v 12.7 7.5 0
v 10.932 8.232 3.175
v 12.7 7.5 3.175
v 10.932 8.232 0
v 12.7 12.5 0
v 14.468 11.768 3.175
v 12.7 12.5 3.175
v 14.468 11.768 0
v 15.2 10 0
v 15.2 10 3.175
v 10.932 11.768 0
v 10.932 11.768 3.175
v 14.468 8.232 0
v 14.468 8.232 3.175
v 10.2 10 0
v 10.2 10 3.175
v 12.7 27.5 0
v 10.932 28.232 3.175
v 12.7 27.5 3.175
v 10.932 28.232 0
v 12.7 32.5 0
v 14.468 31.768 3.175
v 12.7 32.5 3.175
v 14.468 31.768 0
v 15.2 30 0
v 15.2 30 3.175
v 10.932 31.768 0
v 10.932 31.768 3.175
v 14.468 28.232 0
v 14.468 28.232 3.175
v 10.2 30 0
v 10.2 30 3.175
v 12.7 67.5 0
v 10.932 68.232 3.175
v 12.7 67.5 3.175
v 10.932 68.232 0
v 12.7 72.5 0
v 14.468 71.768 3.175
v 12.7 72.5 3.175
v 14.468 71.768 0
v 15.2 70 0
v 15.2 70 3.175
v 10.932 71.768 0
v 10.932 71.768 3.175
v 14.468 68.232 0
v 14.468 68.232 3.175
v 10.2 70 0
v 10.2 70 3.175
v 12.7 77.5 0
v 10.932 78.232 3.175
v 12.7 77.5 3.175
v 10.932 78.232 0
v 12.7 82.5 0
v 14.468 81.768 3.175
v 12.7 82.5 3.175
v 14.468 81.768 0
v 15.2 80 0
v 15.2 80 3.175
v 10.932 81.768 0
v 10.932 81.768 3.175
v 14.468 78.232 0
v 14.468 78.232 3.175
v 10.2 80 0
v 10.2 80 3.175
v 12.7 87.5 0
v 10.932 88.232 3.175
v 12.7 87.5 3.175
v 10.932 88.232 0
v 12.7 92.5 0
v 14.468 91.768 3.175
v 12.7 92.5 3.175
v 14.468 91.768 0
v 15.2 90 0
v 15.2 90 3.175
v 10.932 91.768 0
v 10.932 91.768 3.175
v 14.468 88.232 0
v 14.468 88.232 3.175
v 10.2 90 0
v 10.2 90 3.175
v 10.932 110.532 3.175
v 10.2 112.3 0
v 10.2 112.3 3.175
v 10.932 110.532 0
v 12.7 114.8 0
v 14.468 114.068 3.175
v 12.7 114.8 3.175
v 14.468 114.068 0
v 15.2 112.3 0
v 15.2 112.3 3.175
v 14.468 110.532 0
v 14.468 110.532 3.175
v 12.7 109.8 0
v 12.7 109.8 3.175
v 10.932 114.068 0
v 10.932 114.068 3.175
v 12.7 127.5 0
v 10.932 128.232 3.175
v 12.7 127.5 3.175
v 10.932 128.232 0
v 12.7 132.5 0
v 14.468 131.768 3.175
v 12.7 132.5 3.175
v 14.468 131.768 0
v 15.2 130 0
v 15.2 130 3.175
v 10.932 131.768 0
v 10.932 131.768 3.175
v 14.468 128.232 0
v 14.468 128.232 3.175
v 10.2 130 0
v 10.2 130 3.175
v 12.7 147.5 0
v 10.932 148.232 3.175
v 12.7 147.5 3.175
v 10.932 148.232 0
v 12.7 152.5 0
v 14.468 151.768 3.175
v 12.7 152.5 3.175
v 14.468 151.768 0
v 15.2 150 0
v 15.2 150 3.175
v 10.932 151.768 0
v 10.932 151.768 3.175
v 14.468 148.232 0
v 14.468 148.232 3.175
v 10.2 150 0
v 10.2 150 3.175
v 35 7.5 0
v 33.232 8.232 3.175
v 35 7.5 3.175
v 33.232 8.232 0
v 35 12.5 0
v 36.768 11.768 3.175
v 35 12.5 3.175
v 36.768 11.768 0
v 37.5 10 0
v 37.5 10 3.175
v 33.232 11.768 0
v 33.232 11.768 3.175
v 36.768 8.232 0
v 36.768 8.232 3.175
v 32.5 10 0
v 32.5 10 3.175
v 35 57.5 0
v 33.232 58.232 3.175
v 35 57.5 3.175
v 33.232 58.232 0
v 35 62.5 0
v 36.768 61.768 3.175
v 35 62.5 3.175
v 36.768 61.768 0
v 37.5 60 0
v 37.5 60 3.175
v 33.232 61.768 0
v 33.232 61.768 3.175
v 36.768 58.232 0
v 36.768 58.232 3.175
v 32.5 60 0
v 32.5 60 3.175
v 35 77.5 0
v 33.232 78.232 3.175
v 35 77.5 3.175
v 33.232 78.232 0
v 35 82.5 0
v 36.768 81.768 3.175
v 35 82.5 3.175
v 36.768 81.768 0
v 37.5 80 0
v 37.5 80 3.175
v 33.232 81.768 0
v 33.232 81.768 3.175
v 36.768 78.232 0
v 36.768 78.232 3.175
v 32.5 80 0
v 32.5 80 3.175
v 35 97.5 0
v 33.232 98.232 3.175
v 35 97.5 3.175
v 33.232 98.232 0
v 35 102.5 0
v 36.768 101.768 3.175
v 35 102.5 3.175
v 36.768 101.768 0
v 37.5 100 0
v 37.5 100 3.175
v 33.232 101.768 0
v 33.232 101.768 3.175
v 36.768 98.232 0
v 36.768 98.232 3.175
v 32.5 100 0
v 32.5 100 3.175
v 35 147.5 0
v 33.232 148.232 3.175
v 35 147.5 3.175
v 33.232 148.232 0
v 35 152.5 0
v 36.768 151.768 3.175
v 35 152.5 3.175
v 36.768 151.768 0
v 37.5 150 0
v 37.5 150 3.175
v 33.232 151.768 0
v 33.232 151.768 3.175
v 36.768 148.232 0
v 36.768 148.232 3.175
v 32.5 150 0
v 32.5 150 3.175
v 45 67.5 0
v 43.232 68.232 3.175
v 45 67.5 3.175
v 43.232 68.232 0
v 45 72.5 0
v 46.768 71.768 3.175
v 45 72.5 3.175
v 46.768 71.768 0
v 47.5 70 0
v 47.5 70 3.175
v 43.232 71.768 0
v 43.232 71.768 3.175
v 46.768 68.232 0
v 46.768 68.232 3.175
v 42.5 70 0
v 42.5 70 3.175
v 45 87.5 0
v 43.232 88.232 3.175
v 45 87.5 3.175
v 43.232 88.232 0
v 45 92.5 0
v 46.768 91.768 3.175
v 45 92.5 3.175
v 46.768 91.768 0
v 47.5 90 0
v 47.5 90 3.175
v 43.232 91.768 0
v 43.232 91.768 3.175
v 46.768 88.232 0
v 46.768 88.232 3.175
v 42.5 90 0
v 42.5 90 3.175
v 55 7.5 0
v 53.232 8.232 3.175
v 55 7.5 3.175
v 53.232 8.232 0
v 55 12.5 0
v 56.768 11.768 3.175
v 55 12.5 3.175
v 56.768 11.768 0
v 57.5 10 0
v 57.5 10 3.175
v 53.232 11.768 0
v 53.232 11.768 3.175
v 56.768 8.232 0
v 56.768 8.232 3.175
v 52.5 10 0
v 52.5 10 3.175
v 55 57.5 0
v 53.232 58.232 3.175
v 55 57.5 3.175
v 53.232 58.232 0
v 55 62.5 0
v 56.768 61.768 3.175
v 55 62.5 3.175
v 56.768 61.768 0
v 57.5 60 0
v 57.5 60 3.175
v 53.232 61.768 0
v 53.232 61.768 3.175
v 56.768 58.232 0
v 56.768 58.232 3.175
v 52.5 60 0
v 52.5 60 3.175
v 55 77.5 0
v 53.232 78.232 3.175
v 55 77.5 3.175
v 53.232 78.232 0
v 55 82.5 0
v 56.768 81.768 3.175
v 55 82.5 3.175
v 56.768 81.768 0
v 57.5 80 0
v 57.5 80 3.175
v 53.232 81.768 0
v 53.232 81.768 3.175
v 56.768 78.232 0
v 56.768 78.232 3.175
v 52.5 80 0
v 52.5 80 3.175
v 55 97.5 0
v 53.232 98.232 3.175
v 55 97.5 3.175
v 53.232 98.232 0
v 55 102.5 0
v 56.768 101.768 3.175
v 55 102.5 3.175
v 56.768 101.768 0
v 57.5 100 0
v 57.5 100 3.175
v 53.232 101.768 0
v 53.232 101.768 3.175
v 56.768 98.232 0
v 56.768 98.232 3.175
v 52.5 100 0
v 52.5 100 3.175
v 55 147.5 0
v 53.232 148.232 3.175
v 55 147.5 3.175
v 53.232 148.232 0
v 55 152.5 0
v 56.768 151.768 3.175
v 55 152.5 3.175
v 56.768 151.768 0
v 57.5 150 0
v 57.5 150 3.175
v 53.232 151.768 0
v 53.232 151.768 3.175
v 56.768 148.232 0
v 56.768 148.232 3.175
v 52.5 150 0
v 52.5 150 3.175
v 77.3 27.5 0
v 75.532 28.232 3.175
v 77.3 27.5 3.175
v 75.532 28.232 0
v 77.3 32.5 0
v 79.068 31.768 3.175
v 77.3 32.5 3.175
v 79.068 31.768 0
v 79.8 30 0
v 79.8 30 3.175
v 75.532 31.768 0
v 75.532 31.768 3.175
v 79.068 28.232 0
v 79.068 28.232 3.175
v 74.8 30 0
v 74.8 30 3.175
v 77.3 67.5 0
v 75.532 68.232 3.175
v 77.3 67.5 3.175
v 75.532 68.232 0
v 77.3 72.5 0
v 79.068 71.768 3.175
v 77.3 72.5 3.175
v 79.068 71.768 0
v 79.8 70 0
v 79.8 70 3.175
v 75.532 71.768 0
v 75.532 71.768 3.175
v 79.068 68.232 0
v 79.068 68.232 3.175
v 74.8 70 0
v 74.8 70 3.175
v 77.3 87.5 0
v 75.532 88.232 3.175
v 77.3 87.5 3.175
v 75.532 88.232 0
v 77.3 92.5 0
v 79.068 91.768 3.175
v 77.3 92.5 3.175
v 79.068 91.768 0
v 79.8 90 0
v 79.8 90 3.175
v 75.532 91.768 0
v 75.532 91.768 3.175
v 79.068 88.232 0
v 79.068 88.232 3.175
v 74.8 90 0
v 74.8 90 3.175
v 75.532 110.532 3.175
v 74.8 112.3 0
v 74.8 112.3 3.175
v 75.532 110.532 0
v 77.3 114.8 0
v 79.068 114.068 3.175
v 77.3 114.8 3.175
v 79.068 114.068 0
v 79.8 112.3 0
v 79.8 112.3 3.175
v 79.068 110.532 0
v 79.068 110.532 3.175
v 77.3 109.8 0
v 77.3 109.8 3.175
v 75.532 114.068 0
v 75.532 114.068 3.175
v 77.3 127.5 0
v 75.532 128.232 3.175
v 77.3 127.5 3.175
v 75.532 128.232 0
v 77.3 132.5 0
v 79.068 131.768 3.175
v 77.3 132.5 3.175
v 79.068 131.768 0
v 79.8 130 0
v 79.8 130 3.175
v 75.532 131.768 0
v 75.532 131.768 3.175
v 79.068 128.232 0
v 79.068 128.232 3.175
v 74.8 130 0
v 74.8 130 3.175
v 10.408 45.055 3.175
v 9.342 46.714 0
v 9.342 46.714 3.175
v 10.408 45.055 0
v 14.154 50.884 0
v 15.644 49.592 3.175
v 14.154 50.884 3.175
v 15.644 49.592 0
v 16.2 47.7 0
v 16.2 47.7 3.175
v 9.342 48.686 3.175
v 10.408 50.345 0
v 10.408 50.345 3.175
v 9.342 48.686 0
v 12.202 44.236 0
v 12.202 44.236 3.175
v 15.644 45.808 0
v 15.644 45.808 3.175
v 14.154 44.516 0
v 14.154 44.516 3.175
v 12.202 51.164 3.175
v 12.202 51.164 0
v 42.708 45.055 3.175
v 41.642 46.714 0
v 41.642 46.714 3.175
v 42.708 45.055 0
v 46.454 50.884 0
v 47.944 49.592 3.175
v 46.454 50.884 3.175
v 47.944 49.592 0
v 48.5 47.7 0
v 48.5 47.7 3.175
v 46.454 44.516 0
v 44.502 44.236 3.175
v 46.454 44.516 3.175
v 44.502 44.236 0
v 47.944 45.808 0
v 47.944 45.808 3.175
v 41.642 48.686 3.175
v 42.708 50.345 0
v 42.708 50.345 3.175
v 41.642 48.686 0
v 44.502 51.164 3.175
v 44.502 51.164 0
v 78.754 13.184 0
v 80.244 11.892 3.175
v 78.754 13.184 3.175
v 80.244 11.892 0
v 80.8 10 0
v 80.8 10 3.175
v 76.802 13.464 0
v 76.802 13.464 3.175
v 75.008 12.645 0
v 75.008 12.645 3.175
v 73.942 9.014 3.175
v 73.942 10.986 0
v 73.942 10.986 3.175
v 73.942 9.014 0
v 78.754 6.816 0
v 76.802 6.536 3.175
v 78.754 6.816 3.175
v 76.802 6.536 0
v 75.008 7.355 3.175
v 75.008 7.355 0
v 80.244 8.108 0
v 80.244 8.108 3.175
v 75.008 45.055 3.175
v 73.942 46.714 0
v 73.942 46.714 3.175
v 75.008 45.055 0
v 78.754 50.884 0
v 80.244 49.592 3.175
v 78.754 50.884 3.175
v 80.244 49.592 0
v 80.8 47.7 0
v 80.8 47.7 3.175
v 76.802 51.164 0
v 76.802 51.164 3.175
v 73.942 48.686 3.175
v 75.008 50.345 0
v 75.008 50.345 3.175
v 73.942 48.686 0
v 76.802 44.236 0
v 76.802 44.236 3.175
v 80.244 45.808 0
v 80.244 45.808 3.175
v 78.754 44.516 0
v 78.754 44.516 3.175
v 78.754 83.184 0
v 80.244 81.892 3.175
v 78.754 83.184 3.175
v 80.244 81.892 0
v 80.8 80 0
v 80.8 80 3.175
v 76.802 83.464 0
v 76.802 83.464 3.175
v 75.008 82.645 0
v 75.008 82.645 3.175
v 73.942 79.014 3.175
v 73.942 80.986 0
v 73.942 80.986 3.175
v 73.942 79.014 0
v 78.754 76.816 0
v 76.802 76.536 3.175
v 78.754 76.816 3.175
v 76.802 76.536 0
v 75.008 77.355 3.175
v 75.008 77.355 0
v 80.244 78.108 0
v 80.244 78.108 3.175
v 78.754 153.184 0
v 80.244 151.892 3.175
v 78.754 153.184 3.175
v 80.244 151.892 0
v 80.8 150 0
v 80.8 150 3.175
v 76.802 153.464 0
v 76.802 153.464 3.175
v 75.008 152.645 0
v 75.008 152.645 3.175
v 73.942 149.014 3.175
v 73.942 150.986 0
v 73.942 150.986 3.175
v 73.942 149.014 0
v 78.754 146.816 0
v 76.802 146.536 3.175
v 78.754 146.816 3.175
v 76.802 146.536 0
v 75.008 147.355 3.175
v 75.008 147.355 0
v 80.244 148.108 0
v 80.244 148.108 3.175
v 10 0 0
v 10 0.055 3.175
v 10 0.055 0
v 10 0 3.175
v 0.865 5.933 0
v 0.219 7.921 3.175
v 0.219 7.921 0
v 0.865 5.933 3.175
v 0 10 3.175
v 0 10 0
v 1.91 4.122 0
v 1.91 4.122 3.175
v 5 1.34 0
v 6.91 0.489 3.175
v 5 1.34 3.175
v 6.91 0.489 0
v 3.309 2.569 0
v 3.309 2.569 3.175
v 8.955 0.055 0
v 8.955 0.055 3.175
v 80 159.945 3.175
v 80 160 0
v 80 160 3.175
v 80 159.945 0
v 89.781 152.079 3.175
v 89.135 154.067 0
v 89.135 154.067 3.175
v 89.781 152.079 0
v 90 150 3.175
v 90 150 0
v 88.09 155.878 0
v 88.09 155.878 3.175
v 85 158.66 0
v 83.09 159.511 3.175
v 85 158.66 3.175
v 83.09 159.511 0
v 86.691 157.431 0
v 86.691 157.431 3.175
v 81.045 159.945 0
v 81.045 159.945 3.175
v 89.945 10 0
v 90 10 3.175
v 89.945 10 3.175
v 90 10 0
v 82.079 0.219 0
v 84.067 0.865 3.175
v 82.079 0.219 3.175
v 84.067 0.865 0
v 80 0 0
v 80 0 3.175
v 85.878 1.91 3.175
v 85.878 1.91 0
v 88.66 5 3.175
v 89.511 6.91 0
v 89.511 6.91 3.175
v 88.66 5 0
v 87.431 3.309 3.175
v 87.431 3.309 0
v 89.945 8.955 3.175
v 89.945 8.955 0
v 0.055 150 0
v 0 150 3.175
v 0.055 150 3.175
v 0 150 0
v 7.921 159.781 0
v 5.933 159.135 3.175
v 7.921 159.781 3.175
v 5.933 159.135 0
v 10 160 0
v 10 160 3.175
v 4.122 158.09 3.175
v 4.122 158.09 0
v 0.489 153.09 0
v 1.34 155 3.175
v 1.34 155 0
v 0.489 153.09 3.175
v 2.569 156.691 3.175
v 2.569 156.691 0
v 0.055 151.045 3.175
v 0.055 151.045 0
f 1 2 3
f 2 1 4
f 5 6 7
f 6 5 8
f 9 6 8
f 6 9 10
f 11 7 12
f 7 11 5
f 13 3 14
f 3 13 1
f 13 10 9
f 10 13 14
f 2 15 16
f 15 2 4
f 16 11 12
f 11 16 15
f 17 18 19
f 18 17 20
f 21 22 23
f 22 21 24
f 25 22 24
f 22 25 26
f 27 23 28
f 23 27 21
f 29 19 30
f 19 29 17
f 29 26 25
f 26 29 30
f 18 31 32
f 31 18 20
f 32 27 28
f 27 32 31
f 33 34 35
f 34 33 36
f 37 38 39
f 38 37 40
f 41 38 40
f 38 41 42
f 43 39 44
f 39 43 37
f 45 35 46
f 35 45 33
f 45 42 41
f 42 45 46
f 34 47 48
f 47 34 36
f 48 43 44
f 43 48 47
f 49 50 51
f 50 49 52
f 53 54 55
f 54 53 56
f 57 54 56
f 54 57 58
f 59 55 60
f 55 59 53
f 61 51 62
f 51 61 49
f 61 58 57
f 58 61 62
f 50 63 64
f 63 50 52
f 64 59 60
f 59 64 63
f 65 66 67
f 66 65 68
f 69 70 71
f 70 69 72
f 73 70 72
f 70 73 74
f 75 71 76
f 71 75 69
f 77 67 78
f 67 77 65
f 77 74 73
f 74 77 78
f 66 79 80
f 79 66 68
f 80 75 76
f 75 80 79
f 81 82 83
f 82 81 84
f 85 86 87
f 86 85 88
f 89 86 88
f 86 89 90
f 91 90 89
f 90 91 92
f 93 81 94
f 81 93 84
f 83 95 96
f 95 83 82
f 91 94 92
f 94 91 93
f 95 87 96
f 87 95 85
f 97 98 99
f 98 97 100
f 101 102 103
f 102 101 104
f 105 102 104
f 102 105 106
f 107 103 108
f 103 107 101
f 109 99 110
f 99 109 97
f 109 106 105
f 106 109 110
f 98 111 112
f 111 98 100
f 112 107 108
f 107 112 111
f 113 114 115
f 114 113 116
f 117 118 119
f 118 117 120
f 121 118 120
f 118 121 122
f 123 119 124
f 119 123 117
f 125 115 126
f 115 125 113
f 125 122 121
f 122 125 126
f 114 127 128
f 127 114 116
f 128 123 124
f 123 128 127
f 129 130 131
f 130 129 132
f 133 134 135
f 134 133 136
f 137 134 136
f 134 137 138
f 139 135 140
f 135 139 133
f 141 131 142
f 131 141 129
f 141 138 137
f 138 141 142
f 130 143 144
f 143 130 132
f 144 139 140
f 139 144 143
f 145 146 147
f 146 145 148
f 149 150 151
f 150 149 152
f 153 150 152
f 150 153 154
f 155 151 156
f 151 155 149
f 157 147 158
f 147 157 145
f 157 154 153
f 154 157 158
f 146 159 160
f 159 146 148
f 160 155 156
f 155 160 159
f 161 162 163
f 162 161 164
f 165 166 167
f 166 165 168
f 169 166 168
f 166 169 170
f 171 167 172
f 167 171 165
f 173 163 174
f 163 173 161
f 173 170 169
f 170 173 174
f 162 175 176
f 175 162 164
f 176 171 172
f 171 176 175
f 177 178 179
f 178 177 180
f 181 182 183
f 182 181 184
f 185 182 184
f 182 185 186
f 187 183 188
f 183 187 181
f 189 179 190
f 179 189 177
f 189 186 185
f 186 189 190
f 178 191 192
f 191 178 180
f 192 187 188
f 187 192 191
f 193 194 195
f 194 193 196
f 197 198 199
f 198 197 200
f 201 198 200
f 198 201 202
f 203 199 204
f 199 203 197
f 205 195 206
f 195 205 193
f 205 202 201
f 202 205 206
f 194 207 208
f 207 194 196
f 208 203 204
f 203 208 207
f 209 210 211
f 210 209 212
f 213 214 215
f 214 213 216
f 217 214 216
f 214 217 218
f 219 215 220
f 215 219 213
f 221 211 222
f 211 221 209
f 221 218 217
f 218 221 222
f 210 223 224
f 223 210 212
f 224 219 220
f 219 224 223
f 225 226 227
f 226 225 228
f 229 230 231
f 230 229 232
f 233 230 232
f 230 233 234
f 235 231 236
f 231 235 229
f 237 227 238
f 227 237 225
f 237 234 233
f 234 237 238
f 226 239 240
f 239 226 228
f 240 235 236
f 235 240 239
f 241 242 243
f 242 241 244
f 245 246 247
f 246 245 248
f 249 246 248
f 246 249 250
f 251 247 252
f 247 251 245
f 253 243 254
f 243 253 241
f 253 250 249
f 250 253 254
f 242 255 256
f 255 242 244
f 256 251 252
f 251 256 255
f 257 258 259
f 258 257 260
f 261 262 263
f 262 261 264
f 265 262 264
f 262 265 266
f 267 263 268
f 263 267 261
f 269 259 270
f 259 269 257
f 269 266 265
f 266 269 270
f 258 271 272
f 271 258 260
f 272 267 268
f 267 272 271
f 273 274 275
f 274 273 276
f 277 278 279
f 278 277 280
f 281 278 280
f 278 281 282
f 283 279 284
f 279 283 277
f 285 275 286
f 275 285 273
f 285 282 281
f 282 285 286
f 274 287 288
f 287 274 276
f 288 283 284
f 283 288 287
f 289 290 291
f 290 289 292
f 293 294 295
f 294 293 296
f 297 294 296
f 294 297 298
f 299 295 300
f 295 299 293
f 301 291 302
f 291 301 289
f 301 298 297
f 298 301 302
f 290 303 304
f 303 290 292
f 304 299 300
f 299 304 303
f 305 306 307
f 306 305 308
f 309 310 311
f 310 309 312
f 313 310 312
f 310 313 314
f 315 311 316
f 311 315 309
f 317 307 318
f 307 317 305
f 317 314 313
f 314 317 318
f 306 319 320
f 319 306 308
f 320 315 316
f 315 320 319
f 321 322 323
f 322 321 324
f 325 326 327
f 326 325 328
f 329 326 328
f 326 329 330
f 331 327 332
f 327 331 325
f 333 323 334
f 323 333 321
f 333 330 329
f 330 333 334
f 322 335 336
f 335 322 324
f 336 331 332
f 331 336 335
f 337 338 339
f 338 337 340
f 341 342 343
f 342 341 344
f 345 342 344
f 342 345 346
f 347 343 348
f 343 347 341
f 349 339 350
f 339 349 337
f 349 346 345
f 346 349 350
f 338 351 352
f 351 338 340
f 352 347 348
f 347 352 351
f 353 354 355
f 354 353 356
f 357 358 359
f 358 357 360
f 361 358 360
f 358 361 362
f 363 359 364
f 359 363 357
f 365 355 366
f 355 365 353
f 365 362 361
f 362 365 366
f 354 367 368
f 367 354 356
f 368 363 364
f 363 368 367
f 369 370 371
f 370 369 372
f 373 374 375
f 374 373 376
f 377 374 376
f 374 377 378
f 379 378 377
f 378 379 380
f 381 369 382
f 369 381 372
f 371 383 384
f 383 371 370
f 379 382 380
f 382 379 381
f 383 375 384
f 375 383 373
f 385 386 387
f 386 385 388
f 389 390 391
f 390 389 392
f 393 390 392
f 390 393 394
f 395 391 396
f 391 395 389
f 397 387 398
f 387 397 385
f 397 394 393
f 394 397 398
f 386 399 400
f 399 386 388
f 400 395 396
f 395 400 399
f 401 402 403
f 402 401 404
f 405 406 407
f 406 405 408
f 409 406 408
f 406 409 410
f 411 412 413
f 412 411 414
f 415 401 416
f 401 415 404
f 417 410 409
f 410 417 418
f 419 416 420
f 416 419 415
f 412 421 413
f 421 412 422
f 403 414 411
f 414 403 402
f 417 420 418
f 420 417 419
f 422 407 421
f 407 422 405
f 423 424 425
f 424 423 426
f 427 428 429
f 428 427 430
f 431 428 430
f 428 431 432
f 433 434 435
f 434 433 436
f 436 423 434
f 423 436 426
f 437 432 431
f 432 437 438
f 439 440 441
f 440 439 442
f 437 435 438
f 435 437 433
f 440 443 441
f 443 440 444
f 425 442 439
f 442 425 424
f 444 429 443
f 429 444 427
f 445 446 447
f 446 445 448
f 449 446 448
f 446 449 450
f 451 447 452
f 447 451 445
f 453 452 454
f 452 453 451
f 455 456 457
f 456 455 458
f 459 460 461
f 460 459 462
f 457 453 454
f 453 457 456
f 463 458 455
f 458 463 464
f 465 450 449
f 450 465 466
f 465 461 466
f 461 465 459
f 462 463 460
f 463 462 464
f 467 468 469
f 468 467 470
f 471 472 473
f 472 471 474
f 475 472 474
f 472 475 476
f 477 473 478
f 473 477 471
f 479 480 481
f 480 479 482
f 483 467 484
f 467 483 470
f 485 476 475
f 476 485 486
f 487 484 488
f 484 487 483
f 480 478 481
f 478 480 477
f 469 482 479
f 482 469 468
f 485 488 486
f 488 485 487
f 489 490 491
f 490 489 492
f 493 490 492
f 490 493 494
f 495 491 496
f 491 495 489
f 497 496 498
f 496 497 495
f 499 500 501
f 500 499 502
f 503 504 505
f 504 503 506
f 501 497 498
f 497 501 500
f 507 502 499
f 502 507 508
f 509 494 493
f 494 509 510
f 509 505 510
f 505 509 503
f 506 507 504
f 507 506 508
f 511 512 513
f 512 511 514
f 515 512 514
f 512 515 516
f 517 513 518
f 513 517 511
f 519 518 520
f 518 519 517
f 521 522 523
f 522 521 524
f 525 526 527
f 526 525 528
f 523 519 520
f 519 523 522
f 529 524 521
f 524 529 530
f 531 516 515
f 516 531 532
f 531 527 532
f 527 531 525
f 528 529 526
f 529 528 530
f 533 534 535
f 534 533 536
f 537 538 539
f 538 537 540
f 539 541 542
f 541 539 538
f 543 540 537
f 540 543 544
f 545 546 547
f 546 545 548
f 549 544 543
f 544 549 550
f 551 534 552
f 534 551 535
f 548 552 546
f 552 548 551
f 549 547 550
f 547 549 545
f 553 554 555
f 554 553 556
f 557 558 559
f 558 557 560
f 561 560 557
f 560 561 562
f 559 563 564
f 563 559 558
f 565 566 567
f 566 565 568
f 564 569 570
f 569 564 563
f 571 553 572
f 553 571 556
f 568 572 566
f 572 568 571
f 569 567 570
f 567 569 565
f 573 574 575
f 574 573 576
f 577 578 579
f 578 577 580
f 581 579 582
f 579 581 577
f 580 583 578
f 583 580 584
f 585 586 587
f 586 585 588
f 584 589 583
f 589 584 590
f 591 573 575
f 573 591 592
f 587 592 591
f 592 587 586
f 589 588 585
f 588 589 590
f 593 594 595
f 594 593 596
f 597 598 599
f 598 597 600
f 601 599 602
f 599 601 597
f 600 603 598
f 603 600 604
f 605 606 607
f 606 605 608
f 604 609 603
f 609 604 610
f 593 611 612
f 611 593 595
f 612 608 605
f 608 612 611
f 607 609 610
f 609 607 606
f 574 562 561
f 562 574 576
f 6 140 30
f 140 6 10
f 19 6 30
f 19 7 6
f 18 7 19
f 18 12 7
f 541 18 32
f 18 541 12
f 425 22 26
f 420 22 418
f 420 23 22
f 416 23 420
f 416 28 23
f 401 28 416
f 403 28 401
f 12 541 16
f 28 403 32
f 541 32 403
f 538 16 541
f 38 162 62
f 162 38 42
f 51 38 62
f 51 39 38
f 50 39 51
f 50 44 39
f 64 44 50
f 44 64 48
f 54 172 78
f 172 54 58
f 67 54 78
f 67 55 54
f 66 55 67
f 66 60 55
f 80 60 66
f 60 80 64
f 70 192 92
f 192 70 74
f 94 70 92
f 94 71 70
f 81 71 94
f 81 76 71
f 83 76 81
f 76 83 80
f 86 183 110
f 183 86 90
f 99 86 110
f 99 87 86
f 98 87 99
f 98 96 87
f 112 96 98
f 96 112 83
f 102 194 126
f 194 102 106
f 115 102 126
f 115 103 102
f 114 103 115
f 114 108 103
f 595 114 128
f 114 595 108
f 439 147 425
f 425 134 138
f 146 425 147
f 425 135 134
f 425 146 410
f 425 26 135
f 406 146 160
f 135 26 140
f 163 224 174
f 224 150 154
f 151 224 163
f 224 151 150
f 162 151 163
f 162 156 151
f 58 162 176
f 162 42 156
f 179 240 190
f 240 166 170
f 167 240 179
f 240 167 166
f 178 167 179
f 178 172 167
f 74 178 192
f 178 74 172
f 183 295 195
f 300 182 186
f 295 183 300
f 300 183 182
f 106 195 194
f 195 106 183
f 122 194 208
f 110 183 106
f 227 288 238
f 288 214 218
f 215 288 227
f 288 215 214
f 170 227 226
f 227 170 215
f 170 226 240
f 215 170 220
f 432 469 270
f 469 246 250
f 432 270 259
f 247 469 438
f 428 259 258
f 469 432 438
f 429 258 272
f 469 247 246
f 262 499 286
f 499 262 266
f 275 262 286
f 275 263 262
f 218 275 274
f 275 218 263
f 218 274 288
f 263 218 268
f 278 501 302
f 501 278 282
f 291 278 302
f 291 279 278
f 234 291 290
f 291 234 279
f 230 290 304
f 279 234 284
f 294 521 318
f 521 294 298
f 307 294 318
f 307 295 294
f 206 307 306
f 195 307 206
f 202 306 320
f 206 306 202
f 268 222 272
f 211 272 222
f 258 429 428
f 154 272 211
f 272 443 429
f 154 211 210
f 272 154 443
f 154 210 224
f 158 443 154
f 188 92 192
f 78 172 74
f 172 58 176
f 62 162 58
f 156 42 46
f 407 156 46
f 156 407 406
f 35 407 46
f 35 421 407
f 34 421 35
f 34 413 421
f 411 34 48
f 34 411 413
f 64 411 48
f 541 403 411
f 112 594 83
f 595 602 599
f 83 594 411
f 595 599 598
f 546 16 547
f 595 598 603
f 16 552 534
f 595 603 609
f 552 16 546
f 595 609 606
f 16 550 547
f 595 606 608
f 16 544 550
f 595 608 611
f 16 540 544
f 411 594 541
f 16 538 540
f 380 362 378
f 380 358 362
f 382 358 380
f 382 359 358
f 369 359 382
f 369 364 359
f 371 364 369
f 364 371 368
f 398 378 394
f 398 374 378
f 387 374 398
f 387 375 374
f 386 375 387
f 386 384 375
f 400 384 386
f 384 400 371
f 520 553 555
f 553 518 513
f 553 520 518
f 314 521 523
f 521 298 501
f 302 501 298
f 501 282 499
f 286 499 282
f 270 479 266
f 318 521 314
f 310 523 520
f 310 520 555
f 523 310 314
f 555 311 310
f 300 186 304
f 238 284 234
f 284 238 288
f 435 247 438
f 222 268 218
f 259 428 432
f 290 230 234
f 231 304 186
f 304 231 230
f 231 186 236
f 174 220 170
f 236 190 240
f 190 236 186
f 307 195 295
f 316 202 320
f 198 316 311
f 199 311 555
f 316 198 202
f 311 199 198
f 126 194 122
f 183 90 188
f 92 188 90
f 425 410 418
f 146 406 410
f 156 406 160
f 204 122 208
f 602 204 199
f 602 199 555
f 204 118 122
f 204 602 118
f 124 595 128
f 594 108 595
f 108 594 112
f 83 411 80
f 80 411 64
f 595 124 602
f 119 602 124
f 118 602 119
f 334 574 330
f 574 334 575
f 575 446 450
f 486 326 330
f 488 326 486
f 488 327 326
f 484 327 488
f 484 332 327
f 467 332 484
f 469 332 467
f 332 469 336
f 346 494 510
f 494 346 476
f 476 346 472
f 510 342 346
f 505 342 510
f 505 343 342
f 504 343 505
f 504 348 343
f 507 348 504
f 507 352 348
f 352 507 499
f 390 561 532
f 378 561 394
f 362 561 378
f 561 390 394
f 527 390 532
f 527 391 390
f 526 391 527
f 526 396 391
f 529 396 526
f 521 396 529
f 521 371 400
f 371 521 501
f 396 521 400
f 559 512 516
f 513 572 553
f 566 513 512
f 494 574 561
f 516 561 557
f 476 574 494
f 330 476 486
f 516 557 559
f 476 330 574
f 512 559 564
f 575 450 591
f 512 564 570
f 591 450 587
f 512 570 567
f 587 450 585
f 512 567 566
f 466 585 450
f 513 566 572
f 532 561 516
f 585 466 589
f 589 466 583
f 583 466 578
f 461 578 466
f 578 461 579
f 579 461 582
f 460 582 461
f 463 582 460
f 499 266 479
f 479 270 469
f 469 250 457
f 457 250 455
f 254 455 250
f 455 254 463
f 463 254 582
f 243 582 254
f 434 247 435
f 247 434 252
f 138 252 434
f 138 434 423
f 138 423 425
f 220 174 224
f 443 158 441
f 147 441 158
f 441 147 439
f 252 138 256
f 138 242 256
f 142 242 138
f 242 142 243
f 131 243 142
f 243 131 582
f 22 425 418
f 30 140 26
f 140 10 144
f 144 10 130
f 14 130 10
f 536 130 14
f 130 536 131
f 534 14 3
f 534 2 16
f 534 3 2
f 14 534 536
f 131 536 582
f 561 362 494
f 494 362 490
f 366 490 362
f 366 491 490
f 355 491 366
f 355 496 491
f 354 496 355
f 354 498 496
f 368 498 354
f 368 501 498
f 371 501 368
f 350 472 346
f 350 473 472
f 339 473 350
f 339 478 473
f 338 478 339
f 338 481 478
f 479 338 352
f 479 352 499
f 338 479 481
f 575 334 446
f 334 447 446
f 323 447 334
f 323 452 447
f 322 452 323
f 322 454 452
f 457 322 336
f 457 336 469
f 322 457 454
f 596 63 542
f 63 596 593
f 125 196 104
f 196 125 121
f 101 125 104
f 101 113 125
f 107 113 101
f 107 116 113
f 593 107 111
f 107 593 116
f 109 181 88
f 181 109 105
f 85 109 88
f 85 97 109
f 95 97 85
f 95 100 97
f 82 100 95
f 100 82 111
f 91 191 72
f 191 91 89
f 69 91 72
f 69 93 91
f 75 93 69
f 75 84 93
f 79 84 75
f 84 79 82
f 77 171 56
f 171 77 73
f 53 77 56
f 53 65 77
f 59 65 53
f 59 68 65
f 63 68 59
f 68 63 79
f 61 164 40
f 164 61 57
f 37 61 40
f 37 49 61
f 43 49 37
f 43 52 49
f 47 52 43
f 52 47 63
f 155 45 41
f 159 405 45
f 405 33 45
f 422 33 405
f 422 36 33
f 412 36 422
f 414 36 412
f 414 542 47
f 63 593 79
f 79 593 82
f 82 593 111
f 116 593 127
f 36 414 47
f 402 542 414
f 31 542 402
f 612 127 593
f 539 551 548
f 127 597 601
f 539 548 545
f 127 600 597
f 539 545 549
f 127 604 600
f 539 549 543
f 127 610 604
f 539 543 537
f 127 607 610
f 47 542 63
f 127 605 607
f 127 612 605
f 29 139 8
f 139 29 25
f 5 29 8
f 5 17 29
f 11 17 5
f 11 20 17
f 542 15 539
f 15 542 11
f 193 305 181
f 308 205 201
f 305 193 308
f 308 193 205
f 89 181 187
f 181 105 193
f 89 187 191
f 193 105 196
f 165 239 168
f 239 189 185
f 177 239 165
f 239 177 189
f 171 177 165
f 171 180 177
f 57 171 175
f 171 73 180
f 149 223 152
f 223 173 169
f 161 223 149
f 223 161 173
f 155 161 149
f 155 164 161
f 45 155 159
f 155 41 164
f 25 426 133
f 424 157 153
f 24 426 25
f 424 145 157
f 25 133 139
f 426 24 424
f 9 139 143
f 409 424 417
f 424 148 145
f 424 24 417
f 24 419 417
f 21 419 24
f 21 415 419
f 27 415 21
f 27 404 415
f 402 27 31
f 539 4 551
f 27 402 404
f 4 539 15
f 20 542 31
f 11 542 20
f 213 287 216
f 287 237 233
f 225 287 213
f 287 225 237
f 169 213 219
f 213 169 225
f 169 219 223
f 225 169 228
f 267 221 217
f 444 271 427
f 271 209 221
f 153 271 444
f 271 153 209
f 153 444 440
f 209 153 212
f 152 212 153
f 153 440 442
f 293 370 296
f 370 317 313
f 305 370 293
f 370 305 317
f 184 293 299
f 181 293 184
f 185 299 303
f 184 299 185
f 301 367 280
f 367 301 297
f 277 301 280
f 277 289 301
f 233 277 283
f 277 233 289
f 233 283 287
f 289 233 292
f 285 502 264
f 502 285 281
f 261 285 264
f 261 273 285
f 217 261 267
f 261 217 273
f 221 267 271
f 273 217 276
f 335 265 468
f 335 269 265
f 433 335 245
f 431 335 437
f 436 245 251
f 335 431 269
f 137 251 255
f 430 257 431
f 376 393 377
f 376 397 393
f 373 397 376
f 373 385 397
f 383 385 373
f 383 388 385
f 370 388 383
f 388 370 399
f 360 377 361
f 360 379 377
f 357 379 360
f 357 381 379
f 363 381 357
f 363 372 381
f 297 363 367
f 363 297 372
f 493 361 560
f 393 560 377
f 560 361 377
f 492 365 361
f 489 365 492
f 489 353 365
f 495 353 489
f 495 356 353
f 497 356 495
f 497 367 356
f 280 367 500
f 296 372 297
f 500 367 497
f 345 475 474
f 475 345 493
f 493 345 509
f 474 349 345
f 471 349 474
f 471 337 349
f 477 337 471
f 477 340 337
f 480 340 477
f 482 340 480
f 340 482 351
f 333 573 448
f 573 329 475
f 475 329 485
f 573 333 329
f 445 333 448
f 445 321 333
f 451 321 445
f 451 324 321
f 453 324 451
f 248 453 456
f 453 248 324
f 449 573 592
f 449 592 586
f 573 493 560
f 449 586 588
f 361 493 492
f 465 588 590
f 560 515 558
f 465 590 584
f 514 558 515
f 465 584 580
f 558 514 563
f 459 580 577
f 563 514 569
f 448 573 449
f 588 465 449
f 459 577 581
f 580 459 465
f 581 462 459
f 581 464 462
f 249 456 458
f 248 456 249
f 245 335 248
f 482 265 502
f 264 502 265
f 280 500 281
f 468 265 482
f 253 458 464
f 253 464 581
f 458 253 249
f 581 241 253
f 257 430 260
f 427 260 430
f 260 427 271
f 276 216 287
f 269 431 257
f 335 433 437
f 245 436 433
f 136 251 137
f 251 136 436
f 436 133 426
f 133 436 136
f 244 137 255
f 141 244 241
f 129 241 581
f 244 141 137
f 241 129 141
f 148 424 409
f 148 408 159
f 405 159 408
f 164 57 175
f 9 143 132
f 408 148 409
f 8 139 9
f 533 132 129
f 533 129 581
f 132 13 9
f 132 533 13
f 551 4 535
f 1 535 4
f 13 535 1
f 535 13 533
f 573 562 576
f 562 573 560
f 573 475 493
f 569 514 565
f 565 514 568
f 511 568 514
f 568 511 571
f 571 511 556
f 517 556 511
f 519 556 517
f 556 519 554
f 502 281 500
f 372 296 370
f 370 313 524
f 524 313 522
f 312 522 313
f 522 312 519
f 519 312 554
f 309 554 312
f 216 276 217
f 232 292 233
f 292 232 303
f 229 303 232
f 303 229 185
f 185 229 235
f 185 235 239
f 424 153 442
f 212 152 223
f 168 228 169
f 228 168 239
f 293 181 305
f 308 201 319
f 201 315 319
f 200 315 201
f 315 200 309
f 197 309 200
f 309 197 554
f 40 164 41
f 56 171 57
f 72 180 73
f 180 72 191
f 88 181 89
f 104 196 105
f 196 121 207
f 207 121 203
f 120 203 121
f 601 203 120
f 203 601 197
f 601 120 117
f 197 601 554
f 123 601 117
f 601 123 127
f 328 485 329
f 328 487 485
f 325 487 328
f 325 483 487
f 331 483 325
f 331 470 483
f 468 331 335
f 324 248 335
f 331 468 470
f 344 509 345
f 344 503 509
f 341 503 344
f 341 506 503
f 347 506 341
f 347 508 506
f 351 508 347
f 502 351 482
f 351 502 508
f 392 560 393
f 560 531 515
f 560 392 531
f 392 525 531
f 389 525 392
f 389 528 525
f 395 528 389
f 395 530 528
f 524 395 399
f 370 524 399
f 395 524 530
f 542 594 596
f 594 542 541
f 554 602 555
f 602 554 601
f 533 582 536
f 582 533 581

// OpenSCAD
// MakerSlide Component
// http://www.makerslide.com
// c14005_rev_2
// Standard Wheel Carriage Plate
// Original by Barton Dring
// OpenSCAD model by Mike Sheldrake

standard_wheel_carriage_plate();

module standard_wheel_carriage_plate(thickness=3.175) {
color([175/255,178/255,183/255])
difference() {

// 90mm by 160mm plate 
// 3.175mm thick by default,
// but you can pass a different thickness to this module
cube([90,160,3.175],center=false);

// 5mm diam. holes
for(i=[
  [12.7,10],
  [12.7,30],
  [12.7,70],
  [12.7,80],
  [12.7,90],
  [12.7,112.3],
  [12.7,130],
  [12.7,150],
  [35,10],
  [35,60],
  [35,80],
  [35,100],
  [35,150],
  [45,70],
  [45,90],
  [55,10],
  [55,60],
  [55,80],
  [55,100],
  [55,150],
  [77.3,30],
  [77.3,70],
  [77.3,90],
  [77.3,112.3],
  [77.3,130],

  //These are 5mm holes in the 7mm hole spots that we will do next.
  //For some reason including them here too makes the OpenCSG display look right.
  //Not needed for CGAL render though.
  [12.7,47.7],
  [45,47.7],
  [77.3,10],
  [77.3,47.7],
  [77.3,80],
  [77.3,150]

  ]) { translate([i[0],i[1],-0.2]) cylinder(h=thickness+1,r=5/2,center=false); }

// 7mm diam. holes 
for(i=[
  [12.7,47.7],
  [45,47.7],
  [77.3,10],
  [77.3,47.7],
  [77.3,80],
  [77.3,150]
  ]) { translate([i[0],i[1],-0.2]) cylinder(h=thickness+1,r=7/2,center=false); }

// rounded corners on plate 
for(i=[
  [0,0,0],
  [90,160,180],
  [90,0,90],
  [0,160,270]
  ]
  ) {
	translate([i[0],i[1],0]) rotate(a=[0,0,i[2]]) translate([10,10,-0.1]) rotate(a=[0,0,180]) difference() {
		cube([11,11,thickness+1],center=false);
		translate([0,0,-0.1]) cylinder(h=thickness+2,r=10,center=false);
		}
	}
}
}
